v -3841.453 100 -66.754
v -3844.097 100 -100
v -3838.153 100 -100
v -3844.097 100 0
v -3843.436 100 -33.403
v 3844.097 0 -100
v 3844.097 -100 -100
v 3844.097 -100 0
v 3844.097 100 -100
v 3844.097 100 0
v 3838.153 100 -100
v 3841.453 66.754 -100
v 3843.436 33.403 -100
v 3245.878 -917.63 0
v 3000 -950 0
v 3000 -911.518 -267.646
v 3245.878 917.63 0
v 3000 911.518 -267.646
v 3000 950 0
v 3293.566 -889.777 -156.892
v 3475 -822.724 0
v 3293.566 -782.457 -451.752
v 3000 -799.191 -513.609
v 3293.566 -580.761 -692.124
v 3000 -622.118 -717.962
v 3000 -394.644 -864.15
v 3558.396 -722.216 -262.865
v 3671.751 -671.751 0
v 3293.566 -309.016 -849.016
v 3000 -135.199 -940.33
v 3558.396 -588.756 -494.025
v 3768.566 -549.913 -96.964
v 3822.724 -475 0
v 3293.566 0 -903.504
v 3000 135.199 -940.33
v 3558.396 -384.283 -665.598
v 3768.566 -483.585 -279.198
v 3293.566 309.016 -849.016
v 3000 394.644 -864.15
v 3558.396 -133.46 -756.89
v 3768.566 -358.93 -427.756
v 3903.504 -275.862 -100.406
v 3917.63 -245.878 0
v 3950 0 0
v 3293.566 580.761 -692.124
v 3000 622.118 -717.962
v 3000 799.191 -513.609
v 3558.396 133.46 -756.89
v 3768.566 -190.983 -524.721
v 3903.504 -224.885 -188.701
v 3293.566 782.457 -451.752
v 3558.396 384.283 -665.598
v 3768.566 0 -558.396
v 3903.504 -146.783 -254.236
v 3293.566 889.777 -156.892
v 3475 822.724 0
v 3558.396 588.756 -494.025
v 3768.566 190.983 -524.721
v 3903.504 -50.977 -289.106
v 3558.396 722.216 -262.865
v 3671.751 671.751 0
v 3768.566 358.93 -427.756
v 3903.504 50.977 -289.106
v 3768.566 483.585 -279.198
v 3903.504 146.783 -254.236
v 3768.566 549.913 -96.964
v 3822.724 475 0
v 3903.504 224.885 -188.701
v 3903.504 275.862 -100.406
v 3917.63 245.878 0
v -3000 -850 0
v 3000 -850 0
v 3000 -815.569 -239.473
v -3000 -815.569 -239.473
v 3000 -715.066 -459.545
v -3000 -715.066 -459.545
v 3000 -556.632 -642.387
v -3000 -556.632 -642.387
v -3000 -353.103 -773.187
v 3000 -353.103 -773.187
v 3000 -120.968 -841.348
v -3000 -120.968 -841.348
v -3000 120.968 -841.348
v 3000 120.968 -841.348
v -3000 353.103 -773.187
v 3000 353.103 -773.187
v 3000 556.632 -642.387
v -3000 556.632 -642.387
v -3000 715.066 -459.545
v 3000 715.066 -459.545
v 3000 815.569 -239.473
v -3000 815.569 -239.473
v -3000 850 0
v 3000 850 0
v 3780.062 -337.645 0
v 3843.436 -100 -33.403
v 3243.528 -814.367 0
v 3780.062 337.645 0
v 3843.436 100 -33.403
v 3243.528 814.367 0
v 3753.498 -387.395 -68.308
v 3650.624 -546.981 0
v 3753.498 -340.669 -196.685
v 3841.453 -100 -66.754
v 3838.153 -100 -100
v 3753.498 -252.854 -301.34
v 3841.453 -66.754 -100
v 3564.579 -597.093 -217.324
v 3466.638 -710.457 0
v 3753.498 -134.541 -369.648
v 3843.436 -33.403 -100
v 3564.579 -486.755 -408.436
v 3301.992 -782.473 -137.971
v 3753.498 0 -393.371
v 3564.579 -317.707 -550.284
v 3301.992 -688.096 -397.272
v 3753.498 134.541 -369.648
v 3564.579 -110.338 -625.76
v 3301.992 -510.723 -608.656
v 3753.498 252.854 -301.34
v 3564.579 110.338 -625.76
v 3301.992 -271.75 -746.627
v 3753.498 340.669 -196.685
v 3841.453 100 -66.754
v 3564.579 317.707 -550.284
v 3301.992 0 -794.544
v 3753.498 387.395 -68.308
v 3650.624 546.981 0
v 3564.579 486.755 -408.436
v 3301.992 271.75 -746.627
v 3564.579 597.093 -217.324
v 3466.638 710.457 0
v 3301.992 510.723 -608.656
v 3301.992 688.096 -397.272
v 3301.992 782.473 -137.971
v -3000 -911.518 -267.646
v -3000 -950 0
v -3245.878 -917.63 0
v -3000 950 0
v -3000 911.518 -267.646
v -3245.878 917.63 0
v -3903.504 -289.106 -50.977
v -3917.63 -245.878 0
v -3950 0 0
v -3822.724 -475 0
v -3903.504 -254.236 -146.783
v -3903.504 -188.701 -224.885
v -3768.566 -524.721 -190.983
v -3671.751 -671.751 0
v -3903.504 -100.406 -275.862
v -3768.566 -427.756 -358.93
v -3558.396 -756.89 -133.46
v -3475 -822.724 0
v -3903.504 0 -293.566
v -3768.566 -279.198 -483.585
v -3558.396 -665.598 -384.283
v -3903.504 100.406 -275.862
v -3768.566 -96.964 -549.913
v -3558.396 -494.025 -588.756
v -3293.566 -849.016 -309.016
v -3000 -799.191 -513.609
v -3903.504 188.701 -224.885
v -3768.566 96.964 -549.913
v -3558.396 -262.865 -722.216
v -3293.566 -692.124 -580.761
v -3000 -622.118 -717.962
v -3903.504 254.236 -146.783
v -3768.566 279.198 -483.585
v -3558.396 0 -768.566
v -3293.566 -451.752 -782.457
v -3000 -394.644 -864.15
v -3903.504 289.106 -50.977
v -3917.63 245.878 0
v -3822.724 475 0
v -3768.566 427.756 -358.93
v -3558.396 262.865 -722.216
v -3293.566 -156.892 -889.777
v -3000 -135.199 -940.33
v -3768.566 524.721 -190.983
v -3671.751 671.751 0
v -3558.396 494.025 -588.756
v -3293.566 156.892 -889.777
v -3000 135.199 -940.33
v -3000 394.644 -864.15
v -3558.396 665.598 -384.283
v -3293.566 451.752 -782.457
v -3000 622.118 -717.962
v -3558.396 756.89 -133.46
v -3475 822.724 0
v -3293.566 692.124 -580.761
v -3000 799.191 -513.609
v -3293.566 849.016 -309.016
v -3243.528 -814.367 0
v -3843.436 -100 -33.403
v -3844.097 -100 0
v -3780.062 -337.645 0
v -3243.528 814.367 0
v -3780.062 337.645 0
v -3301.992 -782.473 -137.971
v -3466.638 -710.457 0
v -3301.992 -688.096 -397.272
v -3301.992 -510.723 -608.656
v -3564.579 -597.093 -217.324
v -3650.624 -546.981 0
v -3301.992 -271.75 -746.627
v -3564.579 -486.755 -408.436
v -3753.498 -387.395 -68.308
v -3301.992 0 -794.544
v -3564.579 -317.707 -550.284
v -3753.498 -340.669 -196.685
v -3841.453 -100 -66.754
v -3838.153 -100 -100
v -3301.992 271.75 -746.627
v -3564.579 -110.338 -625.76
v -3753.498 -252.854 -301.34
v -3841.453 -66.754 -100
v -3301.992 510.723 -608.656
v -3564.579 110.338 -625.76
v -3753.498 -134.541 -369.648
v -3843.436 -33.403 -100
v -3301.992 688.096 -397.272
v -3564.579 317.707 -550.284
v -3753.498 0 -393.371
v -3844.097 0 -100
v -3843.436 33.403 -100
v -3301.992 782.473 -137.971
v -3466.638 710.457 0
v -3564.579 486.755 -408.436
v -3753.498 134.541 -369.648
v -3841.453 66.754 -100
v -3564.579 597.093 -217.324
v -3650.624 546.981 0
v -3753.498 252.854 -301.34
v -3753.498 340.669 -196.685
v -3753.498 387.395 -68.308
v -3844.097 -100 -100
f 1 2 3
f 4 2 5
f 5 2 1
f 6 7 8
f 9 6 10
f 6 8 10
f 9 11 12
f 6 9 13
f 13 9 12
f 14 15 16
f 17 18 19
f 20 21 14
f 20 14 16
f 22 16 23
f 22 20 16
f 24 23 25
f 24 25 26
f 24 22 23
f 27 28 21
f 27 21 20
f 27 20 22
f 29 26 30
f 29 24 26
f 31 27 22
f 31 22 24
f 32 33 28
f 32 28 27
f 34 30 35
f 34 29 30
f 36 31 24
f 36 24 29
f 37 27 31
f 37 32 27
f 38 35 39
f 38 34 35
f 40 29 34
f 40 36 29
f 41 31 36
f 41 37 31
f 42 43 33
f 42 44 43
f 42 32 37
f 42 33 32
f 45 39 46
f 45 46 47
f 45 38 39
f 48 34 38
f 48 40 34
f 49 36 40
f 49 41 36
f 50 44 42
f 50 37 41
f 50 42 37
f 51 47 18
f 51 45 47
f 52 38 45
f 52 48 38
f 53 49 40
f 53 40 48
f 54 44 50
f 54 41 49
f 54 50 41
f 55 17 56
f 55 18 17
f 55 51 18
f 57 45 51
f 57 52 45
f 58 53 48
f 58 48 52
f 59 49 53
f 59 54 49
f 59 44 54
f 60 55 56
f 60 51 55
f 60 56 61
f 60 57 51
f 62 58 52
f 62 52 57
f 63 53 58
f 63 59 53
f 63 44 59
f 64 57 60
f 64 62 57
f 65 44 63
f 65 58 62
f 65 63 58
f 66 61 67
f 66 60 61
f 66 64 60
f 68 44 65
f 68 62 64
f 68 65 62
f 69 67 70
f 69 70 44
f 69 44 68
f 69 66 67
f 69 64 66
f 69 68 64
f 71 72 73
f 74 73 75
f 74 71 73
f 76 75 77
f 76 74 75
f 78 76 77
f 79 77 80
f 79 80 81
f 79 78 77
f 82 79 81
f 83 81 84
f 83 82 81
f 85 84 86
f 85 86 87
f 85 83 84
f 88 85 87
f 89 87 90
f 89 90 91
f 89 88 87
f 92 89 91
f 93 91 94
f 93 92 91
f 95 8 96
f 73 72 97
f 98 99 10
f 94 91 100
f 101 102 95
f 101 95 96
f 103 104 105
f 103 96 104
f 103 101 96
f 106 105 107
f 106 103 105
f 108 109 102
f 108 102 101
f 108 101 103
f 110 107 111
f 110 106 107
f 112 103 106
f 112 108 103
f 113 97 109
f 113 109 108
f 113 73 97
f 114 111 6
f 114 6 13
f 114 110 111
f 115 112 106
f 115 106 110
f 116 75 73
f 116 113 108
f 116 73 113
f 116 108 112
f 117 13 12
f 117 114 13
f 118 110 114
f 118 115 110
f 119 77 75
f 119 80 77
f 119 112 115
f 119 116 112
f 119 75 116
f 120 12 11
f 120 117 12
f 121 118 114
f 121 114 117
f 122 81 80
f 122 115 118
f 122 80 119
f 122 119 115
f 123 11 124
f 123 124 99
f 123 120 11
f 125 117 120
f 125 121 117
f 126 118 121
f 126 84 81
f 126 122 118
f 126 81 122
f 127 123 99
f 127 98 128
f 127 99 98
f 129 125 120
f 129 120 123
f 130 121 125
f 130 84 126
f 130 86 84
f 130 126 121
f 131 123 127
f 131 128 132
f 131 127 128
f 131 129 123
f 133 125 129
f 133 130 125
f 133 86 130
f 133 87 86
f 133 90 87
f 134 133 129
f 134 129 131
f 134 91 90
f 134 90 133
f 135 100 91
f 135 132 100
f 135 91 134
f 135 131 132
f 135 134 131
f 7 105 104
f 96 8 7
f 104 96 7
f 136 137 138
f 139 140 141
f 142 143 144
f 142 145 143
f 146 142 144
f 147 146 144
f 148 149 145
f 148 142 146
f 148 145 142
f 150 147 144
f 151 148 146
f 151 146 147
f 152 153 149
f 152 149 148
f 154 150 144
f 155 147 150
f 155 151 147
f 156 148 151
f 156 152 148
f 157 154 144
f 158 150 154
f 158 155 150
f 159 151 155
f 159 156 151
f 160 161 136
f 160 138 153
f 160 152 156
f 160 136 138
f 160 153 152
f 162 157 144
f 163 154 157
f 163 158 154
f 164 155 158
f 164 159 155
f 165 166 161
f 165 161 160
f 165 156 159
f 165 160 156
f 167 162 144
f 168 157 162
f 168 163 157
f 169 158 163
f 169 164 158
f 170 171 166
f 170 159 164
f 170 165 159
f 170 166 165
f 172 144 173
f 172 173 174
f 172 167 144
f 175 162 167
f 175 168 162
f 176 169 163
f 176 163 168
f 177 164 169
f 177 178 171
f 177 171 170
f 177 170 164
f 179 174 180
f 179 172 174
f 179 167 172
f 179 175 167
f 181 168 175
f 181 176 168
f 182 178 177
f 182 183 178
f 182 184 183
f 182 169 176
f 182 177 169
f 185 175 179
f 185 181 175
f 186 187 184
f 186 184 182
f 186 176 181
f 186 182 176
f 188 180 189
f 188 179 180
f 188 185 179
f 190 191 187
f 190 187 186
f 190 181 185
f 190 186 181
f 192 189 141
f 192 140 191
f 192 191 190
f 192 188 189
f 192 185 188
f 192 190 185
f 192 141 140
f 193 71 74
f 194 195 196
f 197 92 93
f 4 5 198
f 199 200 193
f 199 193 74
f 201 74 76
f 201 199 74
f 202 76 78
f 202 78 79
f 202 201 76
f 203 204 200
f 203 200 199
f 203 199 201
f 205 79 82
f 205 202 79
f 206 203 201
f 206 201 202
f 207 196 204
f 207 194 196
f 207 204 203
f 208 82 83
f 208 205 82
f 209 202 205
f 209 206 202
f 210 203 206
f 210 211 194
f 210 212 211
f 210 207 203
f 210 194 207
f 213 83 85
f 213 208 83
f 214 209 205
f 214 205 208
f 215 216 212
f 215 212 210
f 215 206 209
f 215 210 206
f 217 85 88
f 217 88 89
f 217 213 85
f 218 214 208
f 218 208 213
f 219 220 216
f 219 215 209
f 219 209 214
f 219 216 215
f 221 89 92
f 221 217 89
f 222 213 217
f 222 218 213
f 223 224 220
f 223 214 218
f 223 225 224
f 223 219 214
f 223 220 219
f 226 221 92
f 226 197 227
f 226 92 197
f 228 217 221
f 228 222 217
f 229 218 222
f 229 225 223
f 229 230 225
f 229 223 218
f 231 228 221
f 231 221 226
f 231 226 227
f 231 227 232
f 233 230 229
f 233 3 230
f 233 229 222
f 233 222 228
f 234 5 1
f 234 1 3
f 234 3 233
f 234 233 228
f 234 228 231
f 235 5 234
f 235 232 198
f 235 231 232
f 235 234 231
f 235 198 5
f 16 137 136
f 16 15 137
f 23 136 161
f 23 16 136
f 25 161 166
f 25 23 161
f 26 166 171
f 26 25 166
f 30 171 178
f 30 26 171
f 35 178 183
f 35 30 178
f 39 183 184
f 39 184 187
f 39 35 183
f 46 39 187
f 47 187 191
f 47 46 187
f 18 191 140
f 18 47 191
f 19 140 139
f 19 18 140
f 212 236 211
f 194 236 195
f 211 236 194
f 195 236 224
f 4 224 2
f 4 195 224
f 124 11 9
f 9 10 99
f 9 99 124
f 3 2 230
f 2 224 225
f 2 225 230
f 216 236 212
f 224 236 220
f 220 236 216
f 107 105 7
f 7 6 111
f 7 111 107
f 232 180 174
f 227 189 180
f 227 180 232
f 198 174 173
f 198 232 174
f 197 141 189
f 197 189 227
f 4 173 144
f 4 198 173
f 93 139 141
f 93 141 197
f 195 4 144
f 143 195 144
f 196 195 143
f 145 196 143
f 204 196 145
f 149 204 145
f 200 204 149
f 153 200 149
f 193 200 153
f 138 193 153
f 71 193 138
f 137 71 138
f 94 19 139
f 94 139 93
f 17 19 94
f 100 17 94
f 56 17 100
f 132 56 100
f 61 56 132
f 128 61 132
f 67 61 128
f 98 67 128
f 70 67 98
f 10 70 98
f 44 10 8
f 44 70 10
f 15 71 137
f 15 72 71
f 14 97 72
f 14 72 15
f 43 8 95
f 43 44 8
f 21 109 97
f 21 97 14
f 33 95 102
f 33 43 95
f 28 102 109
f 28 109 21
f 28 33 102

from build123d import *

# Parameters (mm, degrees)
REVOLVE_THIN4_ANGLE = 180
SKETCH3_W           = 7688.194301614
SKETCH3_H           = 200
CUT_EXTRUDE1_DEPTH  = 100


# Read off the part's stored shape, not the designer's step: Revolve-Thin4
with BuildPart() as part:
    # Revolve-Thin4 outline → Revolve-Thin4 (revolve)
    with BuildSketch(Plane(origin=(0, 0, 0), x_dir=(0, -1, 0), z_dir=(0, 0, 1))):
        with BuildLine():
            Line((950, -3000), (950, 3000))
            ThreePointArc((950, 3000), (671.751442127, 3671.751442127), (0, 3950))
            Line((0, 3950), (0, -3950))
            ThreePointArc((0, -3950), (671.751442127, -3671.751442127), (950, -3000))
        make_face()
        with BuildLine():
            Line((850, 3000), (850, -3000))
            ThreePointArc((850, -3000), (635.413251357, -3564.579489532), (100, -3844.097150807))
            Line((100, -3844.097150807), (100, 3844.097150807))
            ThreePointArc((100, 3844.097150807), (635.413251357, 3564.579489532), (850, 3000))
        make_face(mode=Mode.SUBTRACT)
    revolve(axis=Axis((0, 0, 0), (1, 0, 0)), revolution_arc=REVOLVE_THIN4_ANGLE)

    # Sketch3 → Cut-Extrude1 (cut)
    with BuildSketch(Plane.XY):
        Rectangle(SKETCH3_W, SKETCH3_H)
    extrude(amount=-CUT_EXTRUDE1_DEPTH, mode=Mode.SUBTRACT)


solid = part.part
